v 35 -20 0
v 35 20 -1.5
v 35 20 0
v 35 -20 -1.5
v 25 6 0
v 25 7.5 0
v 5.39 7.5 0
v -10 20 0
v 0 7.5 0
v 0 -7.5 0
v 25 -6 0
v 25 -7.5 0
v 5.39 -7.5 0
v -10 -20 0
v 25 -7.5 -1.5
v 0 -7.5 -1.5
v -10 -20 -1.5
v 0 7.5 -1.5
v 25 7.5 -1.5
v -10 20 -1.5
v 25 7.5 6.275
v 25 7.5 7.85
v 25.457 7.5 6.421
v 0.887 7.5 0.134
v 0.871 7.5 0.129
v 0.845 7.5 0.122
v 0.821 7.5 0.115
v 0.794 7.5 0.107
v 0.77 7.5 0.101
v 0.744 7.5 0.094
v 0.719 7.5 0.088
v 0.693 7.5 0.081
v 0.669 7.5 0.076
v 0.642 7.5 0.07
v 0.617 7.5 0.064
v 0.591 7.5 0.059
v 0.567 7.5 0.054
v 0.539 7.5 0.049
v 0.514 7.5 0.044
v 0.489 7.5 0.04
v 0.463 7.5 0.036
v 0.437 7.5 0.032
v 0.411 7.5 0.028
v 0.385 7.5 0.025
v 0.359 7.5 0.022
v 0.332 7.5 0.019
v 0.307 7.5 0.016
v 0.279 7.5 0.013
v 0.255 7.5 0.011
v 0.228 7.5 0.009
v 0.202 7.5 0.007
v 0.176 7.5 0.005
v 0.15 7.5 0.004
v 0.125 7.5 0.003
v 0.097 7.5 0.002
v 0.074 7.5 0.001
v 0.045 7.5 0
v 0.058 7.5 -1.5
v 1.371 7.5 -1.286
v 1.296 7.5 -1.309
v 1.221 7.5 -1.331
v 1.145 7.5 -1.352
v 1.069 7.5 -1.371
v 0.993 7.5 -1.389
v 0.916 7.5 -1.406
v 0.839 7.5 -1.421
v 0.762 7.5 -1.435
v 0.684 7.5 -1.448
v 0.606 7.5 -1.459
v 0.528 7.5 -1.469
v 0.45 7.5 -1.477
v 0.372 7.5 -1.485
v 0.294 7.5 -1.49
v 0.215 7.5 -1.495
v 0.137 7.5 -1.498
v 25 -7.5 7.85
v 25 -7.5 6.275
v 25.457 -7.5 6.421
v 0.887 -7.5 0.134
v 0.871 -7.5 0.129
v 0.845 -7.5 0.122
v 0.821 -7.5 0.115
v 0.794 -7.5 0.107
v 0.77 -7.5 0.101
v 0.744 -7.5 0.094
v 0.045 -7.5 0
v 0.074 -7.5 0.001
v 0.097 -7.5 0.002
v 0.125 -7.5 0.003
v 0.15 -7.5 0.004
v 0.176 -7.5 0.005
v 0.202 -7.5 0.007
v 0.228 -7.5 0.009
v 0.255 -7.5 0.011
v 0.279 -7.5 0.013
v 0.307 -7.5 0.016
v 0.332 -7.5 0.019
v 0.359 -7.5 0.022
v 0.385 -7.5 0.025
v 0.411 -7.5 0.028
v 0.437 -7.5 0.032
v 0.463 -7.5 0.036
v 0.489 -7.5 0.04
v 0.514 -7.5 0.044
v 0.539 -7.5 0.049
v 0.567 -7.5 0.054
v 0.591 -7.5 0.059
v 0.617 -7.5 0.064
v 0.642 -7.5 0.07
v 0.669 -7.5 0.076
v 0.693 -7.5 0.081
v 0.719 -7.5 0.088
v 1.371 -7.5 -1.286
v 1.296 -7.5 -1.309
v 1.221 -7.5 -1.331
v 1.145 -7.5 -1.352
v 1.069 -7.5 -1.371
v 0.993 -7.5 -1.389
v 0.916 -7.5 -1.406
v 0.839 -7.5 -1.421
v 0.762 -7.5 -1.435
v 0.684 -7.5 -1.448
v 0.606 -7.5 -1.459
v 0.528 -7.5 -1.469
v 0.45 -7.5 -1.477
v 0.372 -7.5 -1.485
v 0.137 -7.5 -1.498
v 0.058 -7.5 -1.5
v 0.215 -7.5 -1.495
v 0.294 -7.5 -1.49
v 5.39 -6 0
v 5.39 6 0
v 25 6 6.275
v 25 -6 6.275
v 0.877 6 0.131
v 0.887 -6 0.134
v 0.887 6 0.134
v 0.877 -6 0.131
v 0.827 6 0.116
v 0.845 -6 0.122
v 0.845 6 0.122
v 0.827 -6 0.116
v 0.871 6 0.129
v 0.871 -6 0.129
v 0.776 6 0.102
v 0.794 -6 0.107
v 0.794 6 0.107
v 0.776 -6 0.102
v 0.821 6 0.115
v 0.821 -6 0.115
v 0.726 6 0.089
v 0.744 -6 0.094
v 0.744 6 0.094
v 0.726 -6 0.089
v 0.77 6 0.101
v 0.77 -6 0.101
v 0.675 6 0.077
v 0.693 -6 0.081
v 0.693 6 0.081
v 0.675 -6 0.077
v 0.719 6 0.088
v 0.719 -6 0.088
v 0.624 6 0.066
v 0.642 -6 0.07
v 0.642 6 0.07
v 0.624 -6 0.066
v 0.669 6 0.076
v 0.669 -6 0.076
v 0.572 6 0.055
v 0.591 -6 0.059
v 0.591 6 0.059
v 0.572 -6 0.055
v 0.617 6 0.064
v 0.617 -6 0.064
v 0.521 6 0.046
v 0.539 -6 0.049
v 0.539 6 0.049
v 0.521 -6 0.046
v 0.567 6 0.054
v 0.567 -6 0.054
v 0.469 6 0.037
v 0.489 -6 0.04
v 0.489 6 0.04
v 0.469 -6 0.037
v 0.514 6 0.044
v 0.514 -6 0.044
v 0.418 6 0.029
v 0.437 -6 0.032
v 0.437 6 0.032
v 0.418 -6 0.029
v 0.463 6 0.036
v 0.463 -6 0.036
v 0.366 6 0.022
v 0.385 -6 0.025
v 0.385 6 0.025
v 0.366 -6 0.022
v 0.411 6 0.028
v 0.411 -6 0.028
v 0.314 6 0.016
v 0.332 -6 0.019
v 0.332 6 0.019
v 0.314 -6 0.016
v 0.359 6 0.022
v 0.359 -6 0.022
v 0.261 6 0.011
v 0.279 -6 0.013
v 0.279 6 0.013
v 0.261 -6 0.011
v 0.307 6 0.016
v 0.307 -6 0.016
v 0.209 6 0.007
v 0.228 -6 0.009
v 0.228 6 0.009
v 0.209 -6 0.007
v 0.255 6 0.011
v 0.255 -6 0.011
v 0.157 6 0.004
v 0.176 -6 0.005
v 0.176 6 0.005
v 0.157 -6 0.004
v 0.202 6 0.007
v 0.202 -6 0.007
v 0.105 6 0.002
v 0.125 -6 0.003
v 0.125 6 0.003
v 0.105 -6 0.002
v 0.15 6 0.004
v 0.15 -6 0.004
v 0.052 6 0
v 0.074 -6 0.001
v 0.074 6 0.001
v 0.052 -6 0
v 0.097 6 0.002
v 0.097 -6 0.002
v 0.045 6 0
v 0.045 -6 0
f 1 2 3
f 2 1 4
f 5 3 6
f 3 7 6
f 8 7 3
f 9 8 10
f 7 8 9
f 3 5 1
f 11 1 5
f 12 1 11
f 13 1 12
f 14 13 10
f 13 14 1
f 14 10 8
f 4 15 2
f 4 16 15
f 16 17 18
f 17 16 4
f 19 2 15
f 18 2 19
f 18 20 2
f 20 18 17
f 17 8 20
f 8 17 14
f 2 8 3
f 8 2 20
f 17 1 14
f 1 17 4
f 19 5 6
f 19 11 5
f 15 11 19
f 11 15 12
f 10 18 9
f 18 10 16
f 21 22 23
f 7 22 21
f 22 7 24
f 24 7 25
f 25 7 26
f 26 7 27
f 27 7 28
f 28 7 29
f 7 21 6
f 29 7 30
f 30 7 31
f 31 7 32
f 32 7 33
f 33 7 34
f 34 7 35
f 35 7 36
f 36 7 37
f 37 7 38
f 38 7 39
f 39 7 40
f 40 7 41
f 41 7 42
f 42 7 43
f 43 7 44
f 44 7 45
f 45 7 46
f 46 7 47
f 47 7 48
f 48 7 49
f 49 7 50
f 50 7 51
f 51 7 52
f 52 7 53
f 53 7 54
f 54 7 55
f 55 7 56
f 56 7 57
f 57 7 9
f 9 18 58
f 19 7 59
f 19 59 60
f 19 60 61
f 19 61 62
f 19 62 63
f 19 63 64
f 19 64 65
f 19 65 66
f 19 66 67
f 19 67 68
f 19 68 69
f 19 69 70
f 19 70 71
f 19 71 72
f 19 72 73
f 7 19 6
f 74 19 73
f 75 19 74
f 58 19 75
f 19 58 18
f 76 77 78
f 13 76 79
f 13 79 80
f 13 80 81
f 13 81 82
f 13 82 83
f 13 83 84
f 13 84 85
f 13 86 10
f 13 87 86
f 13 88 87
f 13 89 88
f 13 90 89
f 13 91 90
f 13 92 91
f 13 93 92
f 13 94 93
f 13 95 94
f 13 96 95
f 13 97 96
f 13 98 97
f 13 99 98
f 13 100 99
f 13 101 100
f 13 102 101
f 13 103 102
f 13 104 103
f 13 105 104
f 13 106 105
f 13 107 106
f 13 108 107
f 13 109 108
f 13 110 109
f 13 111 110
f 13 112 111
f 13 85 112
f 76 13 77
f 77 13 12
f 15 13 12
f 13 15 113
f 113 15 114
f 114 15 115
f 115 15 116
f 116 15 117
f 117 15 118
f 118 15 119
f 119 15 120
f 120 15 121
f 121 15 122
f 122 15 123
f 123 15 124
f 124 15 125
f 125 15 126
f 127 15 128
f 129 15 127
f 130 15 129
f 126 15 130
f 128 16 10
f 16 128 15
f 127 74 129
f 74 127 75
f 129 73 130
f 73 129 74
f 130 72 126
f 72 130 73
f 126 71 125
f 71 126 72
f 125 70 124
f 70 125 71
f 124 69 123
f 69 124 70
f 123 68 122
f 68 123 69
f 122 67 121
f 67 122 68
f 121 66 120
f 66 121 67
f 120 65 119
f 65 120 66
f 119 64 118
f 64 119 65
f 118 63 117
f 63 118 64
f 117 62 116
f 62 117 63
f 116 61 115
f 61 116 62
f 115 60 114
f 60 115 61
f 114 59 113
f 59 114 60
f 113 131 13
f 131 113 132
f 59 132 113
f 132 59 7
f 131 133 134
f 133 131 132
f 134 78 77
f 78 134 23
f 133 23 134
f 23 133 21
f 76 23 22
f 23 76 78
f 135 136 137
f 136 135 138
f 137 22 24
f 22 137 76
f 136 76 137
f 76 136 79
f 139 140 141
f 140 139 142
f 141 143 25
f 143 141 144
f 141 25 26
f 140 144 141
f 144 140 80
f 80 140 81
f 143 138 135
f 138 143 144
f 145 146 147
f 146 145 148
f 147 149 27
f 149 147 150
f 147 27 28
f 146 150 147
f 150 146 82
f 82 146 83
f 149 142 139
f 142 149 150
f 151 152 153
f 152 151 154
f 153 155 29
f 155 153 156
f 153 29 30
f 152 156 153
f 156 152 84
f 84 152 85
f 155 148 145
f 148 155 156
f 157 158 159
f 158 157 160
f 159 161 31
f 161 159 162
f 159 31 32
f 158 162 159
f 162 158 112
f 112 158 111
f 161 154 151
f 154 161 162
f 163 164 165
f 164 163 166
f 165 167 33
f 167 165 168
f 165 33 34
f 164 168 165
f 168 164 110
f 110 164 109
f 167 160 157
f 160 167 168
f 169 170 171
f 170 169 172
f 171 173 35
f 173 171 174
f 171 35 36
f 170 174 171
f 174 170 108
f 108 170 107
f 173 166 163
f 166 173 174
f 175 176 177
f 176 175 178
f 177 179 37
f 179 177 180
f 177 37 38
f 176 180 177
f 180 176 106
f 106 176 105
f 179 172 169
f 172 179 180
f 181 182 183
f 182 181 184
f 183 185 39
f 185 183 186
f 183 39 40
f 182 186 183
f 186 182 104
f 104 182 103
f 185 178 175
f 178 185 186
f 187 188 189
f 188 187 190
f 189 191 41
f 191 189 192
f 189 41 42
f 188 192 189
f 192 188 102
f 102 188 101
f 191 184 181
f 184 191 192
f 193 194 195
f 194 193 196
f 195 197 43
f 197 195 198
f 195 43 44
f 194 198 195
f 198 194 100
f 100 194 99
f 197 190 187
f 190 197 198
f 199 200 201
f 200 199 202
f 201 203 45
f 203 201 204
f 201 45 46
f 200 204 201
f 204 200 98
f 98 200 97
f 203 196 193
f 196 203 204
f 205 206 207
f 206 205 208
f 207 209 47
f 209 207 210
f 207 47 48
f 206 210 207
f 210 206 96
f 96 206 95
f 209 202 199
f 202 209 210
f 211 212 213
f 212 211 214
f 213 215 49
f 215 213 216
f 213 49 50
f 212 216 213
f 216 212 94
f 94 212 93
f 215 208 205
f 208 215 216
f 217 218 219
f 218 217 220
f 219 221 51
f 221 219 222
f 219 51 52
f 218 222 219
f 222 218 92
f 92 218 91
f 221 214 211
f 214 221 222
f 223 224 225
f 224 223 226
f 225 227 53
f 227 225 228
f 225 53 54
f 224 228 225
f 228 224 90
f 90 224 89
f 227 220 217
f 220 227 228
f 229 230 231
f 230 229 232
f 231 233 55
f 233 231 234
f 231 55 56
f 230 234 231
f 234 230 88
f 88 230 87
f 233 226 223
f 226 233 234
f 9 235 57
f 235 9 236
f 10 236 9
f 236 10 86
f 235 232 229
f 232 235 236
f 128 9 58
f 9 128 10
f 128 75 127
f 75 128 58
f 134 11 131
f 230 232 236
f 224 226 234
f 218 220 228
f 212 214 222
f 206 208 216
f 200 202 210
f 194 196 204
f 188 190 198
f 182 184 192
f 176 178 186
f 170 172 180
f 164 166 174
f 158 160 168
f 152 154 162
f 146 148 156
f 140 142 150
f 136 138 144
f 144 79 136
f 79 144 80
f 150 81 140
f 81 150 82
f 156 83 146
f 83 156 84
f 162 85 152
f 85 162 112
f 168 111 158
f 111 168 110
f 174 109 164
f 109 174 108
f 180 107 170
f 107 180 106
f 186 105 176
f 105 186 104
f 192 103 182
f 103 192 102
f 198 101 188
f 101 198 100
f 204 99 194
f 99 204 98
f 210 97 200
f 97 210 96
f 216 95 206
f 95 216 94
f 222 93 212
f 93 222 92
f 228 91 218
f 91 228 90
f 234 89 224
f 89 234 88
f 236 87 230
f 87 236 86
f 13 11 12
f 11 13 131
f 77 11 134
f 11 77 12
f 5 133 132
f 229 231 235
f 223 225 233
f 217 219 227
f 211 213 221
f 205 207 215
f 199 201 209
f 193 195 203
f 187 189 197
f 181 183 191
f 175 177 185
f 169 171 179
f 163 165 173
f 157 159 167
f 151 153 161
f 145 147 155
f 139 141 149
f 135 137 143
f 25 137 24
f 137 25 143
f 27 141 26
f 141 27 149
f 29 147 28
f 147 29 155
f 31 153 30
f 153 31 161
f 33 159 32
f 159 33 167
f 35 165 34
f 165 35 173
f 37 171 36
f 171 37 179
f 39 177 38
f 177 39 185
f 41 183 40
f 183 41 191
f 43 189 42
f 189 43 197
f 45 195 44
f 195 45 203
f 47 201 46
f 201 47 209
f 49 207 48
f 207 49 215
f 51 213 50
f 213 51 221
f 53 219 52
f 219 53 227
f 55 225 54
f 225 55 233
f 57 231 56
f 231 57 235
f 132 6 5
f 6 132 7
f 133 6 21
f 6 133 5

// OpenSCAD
// --------------------------------------------------------
// FIXED: Parametric Sheet Metal Louver
// --------------------------------------------------------

// Module 1: The Cutout Tool
module louver_cutout(length, width, thickness) {
    // Extended Z-bounds to ensure a clean boolean cut all the way through
    translate([0, -width/2, -thickness - 1])
        cube([length, width, thickness + 2]);
}

// Module 2: The Stamped Flap & Sheared Walls
module rounded_louver_flap(length, width, height, thickness, radius) {
    // 1. Math Setup & Safety Clamps
    angle = max(atan2(height, length), 0.01); 
    
    // Prevent the radius from being physically too large for the requested length
    max_r = (length * 0.9) / sin(angle);
    r_in = min(max(radius, 0.001), max_r); 
    r_out = r_in + thickness;
    
    // 2. Calculate Exact Tangent Endpoints for the Roof
    tip_ix = length;
    tip_iy = (r_in - r_in * cos(angle)) + (length - r_in * sin(angle)) * tan(angle);
    
    // Offset the outer tip perpendicular to the roof angle to maintain thickness
    tip_ox = tip_ix + thickness * sin(angle);
    tip_oy = tip_iy - thickness * cos(angle);

    // 3. Construct perfectly matching 2D profiles
    // This traces the inner bend, goes to the tip, offsets, and traces the outer bend back
    flap_points = concat(
        [ for (a = [0 : angle]) [ r_in * sin(a), r_in - r_in * cos(a) ] ],
        [ [tip_ix, tip_iy], [tip_ox, tip_oy] ],
        [ for (a = [angle : -1 : 0]) [ r_out * sin(a), r_in - r_out * cos(a) ] ]
    );
    
    // The side wall perfectly traces the inner roof profile backwards to prevent poking through
    wall_points = concat(
        [ [0,0], [tip_ix, 0], [tip_ix, tip_iy] ],
        [ for (a = [angle : -1 : 0]) [ r_in * sin(a), r_in - r_in * cos(a) ] ]
    );

    union() {
        // A. The Rounded Roof Flap
        translate([0, width/2, 0])
            rotate([90, 0, 0])
                linear_extrude(height = width)
                    polygon(flap_points);
                    
        // B. The Left Sheared Wall
        translate([0, -width/2 + thickness, 0])
            rotate([90, 0, 0])
                linear_extrude(height = thickness)
                    polygon(wall_points);
                    
        // C. The Right Sheared Wall
        translate([0, width/2, 0])
            rotate([90, 0, 0])
                linear_extrude(height = thickness)
                    polygon(wall_points);
    }
}

// Module 3: Assembly Wrapper
module stamped_louver(length, width, height, thickness, radius=1) {
    difference() {
        children(); // The base plate passed by the user
        louver_cutout(length, width, thickness);
    }
    rounded_louver_flap(length, width, height, thickness, radius);
}

// ==========================================
// Example Usage & Visualization
// ==========================================

sheet_t = 1.5;
l_len = 25;
l_wid = 15;
l_hgt = 8;
bend_r = 3; 

// Render a base plate with the corrected louver punched into it
color("SteelBlue") {
    stamped_louver(length = l_len, width = l_wid, height = l_hgt, thickness = sheet_t, radius = bend_r) {
        // Base plate geometry
        translate([-10, -20, -sheet_t])
            cube([45, 40, sheet_t]);
    }
}
